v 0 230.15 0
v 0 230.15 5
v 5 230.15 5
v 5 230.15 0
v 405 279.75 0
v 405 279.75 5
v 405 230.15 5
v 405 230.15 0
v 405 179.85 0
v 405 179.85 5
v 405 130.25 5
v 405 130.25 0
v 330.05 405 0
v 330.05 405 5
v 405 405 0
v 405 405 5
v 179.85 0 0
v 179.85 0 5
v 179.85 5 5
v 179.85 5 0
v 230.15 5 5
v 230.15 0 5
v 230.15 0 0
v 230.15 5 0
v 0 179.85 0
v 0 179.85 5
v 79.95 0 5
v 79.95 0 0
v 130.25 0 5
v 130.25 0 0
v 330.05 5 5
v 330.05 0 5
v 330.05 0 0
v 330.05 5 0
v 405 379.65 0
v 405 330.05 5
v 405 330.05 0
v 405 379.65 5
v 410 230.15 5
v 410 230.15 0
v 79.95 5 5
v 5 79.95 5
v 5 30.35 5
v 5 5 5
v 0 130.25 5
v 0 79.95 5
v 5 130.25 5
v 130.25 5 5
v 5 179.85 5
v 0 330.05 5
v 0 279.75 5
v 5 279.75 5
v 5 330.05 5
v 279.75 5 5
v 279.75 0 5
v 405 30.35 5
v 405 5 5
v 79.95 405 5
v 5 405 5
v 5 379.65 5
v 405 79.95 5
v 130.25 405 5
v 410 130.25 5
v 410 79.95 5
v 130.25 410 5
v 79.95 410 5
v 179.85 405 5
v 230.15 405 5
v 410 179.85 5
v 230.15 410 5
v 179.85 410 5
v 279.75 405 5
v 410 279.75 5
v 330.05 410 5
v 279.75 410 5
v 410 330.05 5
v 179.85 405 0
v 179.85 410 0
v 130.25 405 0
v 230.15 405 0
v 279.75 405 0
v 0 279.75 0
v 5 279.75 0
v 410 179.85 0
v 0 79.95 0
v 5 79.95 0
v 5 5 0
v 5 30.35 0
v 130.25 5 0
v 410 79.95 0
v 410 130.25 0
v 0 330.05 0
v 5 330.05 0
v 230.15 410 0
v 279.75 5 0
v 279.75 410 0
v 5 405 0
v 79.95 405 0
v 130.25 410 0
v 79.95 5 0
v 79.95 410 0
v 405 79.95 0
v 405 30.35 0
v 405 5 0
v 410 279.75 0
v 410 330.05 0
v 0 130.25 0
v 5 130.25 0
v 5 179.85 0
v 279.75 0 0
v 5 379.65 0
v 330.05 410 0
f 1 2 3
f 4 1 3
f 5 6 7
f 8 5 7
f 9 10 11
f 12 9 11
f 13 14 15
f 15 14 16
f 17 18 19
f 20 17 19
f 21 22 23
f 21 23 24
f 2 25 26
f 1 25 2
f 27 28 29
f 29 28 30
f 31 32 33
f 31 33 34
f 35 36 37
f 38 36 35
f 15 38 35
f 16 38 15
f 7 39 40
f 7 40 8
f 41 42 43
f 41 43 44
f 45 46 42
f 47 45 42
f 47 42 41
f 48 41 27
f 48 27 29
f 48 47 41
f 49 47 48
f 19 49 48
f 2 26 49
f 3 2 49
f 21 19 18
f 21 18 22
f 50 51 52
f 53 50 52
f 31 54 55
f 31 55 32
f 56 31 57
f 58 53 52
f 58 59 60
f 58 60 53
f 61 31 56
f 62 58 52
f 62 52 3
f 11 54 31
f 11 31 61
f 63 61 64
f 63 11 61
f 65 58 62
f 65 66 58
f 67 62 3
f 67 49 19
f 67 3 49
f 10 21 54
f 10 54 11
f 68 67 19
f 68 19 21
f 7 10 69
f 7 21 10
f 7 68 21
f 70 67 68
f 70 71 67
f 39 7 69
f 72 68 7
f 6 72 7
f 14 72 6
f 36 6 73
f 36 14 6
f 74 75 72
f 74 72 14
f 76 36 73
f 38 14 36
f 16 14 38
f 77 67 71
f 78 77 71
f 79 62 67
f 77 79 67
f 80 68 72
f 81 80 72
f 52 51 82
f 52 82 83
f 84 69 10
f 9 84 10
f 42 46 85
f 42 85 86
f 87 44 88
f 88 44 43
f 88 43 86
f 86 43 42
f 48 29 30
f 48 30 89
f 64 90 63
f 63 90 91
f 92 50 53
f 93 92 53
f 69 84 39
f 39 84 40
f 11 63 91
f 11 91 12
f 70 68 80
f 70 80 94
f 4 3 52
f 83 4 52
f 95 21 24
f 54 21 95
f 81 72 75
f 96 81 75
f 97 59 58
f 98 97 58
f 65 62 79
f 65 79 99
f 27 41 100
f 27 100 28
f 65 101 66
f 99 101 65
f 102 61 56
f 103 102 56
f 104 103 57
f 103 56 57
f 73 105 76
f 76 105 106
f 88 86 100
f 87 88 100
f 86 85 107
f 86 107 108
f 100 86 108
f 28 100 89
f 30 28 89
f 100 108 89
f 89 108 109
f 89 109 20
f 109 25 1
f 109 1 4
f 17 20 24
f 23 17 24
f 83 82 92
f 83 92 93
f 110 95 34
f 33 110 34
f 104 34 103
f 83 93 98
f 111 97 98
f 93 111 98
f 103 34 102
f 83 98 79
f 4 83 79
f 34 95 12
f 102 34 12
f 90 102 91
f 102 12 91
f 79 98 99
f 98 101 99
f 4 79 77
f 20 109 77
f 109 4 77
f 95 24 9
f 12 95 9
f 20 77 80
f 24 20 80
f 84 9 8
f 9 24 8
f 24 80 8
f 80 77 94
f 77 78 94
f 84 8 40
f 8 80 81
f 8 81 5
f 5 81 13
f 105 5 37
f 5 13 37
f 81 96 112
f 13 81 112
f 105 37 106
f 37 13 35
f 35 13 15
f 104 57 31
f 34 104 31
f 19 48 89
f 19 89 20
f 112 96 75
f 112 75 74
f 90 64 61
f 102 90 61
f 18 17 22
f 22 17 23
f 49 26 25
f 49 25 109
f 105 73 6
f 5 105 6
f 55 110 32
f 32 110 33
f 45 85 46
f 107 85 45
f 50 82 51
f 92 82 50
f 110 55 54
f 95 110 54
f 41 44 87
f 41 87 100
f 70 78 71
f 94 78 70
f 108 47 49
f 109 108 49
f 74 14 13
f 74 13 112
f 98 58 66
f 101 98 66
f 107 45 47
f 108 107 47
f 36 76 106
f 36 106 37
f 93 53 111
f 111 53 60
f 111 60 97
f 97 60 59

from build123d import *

# Parameters (mm, degrees)
SKIZZE1_W                       = 410
SKIZZE1_H                       = 410
AUFSATZ_LINEAR_AUSTRAGEN1_DEPTH = 5
SKIZZE2_W                       = 97.796702903
SKIZZE2_H                       = 49.6
SCHNITT_LINEAR_AUSTRAGEN1_DEPTH = 5
LINEARES_MUSTER1_COUNT          = 4
LINEARES_MUSTER1_PITCH          = 99.9
SPIEGELN1_COPY_1_SKETCH_W       = 97.796702903
SPIEGELN1_COPY_1_SKETCH_H       = 49.6
SPIEGELN1_COPY_1_DEPTH          = 5
SPIEGELN1_COPY_2_SKETCH_W       = 97.796702903
SPIEGELN1_COPY_2_SKETCH_H       = 49.6
SPIEGELN1_COPY_2_DEPTH          = 5
SPIEGELN1_COPY_3_SKETCH_W       = 97.796702903
SPIEGELN1_COPY_3_SKETCH_H       = 49.6
SPIEGELN1_COPY_3_DEPTH          = 5
SKIZZE3_W                       = 49.6
SKIZZE3_H                       = 41.77912255
SCHNITT_LINEAR_AUSTRAGEN2_DEPTH = 5
LINEARES_MUSTER2_COUNT          = 4
LINEARES_MUSTER2_PITCH          = 99.9
SPIEGELN2_COPY_1_SKETCH_W       = 49.6
SPIEGELN2_COPY_1_SKETCH_H       = 41.77912255
SPIEGELN2_COPY_1_DEPTH          = 5
SPIEGELN2_COPY_2_SKETCH_W       = 49.6
SPIEGELN2_COPY_2_SKETCH_H       = 41.77912255
SPIEGELN2_COPY_2_DEPTH          = 5
SPIEGELN2_COPY_3_SKETCH_W       = 49.6
SPIEGELN2_COPY_3_SKETCH_H       = 41.77912255
SPIEGELN2_COPY_3_DEPTH          = 5
SCHNITT_LINEAR_AUSTRAGEN3_DEPTH = 5
SPIEGELN4_COPY_1_DEPTH          = 5


with BuildPart() as part:
    # Skizze1 → Aufsatz-Linear austragen1 (new body)
    with BuildSketch(Plane.XY):
        with Locations((205, 205)):
            Rectangle(SKIZZE1_W, SKIZZE1_H)
    extrude(amount=AUFSATZ_LINEAR_AUSTRAGEN1_DEPTH)

    # Skizze2 → Schnitt-Linear austragen1 (cut)
    with BuildSketch(Plane.XY.offset(5)):
        with Locations((-43.898351452, 354.85)):
            Rectangle(SKIZZE2_W, SKIZZE2_H)
    schnitt_linear_austragen1 = extrude(amount=-SCHNITT_LINEAR_AUSTRAGEN1_DEPTH, mode=Mode.SUBTRACT)

    # Lineares Muster1: Schnitt-Linear austragen1 ×4
    with Locations(*[(0, -i * LINEARES_MUSTER1_PITCH, 0) for i in range(1, LINEARES_MUSTER1_COUNT)]):
        add(schnitt_linear_austragen1, mode=Mode.SUBTRACT)

    # Spiegeln1: Schnitt-Linear austragen1 across plane
    add(schnitt_linear_austragen1.mirror(Plane(origin=(205, 0, 0), x_dir=(0, 0, 1), z_dir=(1, 0, 0))), mode=Mode.SUBTRACT)

    # Spiegeln1 copy 1 sketch → Spiegeln1 copy 1 (cut)
    with BuildSketch(Plane(origin=(410, -99.9, 5), x_dir=(-1, 0, 0), z_dir=(0, 0, 1))):
        with Locations((-43.898351452, -354.85)):
            Rectangle(SPIEGELN1_COPY_1_SKETCH_W, SPIEGELN1_COPY_1_SKETCH_H)
    extrude(amount=-SPIEGELN1_COPY_1_DEPTH, mode=Mode.SUBTRACT)

    # Spiegeln1 copy 2 sketch → Spiegeln1 copy 2 (cut)
    with BuildSketch(Plane(origin=(410, -199.8, 5), x_dir=(-1, 0, 0), z_dir=(0, 0, 1))):
        with Locations((-43.898351452, -354.85)):
            Rectangle(SPIEGELN1_COPY_2_SKETCH_W, SPIEGELN1_COPY_2_SKETCH_H)
    extrude(amount=-SPIEGELN1_COPY_2_DEPTH, mode=Mode.SUBTRACT)

    # Spiegeln1 copy 3 sketch → Spiegeln1 copy 3 (cut)
    with BuildSketch(Plane(origin=(410, -299.7, 5), x_dir=(-1, 0, 0), z_dir=(0, 0, 1))):
        with Locations((-43.898351452, -354.85)):
            Rectangle(SPIEGELN1_COPY_3_SKETCH_W, SPIEGELN1_COPY_3_SKETCH_H)
    extrude(amount=-SPIEGELN1_COPY_3_DEPTH, mode=Mode.SUBTRACT)

    # Skizze3 → Schnitt-Linear austragen2 (cut)
    with BuildSketch(Plane.XY.offset(5)):
        with Locations((55.15, 425.889561275)):
            Rectangle(SKIZZE3_W, SKIZZE3_H)
    schnitt_linear_austragen2 = extrude(amount=-SCHNITT_LINEAR_AUSTRAGEN2_DEPTH, mode=Mode.SUBTRACT)

    # Lineares Muster2: Schnitt-Linear austragen2 ×4
    with Locations(*[(i * LINEARES_MUSTER2_PITCH, 0, 0) for i in range(1, LINEARES_MUSTER2_COUNT)]):
        add(schnitt_linear_austragen2, mode=Mode.SUBTRACT)

    # Spiegeln2: Schnitt-Linear austragen2 across plane
    add(schnitt_linear_austragen2.mirror(Plane.ZX.offset(205)), mode=Mode.SUBTRACT)

    # Spiegeln2 copy 1 sketch → Spiegeln2 copy 1 (cut)
    with BuildSketch(Plane(origin=(99.9, 410, 5), x_dir=(1, 0, 0), z_dir=(0, 0, 1))):
        with Locations((55.15, -425.889561275)):
            Rectangle(SPIEGELN2_COPY_1_SKETCH_W, SPIEGELN2_COPY_1_SKETCH_H)
    extrude(amount=-SPIEGELN2_COPY_1_DEPTH, mode=Mode.SUBTRACT)

    # Spiegeln2 copy 2 sketch → Spiegeln2 copy 2 (cut)
    with BuildSketch(Plane(origin=(199.8, 410, 5), x_dir=(1, 0, 0), z_dir=(0, 0, 1))):
        with Locations((55.15, -425.889561275)):
            Rectangle(SPIEGELN2_COPY_2_SKETCH_W, SPIEGELN2_COPY_2_SKETCH_H)
    extrude(amount=-SPIEGELN2_COPY_2_DEPTH, mode=Mode.SUBTRACT)

    # Spiegeln2 copy 3 sketch → Spiegeln2 copy 3 (cut)
    with BuildSketch(Plane(origin=(299.7, 410, 5), x_dir=(1, 0, 0), z_dir=(0, 0, 1))):
        with Locations((55.15, -425.889561275)):
            Rectangle(SPIEGELN2_COPY_3_SKETCH_W, SPIEGELN2_COPY_3_SKETCH_H)
    extrude(amount=-SPIEGELN2_COPY_3_DEPTH, mode=Mode.SUBTRACT)

    # Skizze4 → Schnitt-Linear austragen3 (cut)
    with BuildSketch(Plane.XY.offset(5)):
        Polygon((5, 379.65), (5, 405), (30.35, 405), (30.35, 431.549801047), (5, 431.549801047), (-47.862925009, 431.549801047), (-47.862925009, 405), (-47.862925009, 379.65), align=None)
    schnitt_linear_austragen3 = extrude(amount=-SCHNITT_LINEAR_AUSTRAGEN3_DEPTH, mode=Mode.SUBTRACT)

    # Spiegeln3: Schnitt-Linear austragen3 across plane
    add(schnitt_linear_austragen3.mirror(Plane(origin=(205, 0, 0), x_dir=(0, 0, 1), z_dir=(1, 0, 0))), mode=Mode.SUBTRACT)

    # Spiegeln4: Schnitt-Linear austragen3 across plane
    add(schnitt_linear_austragen3.mirror(Plane.ZX.offset(205)), mode=Mode.SUBTRACT)

    # Spiegeln4 copy 1 sketch → Spiegeln4 copy 1 (cut)
    with BuildSketch(Plane(origin=(410, 410, 5), x_dir=(-1, 0, 0), z_dir=(0, 0, 1))):
        Polygon((5, 379.65), (5, 405), (30.35, 405), (30.35, 431.549801047), (5, 431.549801047), (-47.862925009, 431.549801047), (-47.862925009, 405), (-47.862925009, 379.65), align=None)
    extrude(amount=-SPIEGELN4_COPY_1_DEPTH, mode=Mode.SUBTRACT)


solid = part.part
